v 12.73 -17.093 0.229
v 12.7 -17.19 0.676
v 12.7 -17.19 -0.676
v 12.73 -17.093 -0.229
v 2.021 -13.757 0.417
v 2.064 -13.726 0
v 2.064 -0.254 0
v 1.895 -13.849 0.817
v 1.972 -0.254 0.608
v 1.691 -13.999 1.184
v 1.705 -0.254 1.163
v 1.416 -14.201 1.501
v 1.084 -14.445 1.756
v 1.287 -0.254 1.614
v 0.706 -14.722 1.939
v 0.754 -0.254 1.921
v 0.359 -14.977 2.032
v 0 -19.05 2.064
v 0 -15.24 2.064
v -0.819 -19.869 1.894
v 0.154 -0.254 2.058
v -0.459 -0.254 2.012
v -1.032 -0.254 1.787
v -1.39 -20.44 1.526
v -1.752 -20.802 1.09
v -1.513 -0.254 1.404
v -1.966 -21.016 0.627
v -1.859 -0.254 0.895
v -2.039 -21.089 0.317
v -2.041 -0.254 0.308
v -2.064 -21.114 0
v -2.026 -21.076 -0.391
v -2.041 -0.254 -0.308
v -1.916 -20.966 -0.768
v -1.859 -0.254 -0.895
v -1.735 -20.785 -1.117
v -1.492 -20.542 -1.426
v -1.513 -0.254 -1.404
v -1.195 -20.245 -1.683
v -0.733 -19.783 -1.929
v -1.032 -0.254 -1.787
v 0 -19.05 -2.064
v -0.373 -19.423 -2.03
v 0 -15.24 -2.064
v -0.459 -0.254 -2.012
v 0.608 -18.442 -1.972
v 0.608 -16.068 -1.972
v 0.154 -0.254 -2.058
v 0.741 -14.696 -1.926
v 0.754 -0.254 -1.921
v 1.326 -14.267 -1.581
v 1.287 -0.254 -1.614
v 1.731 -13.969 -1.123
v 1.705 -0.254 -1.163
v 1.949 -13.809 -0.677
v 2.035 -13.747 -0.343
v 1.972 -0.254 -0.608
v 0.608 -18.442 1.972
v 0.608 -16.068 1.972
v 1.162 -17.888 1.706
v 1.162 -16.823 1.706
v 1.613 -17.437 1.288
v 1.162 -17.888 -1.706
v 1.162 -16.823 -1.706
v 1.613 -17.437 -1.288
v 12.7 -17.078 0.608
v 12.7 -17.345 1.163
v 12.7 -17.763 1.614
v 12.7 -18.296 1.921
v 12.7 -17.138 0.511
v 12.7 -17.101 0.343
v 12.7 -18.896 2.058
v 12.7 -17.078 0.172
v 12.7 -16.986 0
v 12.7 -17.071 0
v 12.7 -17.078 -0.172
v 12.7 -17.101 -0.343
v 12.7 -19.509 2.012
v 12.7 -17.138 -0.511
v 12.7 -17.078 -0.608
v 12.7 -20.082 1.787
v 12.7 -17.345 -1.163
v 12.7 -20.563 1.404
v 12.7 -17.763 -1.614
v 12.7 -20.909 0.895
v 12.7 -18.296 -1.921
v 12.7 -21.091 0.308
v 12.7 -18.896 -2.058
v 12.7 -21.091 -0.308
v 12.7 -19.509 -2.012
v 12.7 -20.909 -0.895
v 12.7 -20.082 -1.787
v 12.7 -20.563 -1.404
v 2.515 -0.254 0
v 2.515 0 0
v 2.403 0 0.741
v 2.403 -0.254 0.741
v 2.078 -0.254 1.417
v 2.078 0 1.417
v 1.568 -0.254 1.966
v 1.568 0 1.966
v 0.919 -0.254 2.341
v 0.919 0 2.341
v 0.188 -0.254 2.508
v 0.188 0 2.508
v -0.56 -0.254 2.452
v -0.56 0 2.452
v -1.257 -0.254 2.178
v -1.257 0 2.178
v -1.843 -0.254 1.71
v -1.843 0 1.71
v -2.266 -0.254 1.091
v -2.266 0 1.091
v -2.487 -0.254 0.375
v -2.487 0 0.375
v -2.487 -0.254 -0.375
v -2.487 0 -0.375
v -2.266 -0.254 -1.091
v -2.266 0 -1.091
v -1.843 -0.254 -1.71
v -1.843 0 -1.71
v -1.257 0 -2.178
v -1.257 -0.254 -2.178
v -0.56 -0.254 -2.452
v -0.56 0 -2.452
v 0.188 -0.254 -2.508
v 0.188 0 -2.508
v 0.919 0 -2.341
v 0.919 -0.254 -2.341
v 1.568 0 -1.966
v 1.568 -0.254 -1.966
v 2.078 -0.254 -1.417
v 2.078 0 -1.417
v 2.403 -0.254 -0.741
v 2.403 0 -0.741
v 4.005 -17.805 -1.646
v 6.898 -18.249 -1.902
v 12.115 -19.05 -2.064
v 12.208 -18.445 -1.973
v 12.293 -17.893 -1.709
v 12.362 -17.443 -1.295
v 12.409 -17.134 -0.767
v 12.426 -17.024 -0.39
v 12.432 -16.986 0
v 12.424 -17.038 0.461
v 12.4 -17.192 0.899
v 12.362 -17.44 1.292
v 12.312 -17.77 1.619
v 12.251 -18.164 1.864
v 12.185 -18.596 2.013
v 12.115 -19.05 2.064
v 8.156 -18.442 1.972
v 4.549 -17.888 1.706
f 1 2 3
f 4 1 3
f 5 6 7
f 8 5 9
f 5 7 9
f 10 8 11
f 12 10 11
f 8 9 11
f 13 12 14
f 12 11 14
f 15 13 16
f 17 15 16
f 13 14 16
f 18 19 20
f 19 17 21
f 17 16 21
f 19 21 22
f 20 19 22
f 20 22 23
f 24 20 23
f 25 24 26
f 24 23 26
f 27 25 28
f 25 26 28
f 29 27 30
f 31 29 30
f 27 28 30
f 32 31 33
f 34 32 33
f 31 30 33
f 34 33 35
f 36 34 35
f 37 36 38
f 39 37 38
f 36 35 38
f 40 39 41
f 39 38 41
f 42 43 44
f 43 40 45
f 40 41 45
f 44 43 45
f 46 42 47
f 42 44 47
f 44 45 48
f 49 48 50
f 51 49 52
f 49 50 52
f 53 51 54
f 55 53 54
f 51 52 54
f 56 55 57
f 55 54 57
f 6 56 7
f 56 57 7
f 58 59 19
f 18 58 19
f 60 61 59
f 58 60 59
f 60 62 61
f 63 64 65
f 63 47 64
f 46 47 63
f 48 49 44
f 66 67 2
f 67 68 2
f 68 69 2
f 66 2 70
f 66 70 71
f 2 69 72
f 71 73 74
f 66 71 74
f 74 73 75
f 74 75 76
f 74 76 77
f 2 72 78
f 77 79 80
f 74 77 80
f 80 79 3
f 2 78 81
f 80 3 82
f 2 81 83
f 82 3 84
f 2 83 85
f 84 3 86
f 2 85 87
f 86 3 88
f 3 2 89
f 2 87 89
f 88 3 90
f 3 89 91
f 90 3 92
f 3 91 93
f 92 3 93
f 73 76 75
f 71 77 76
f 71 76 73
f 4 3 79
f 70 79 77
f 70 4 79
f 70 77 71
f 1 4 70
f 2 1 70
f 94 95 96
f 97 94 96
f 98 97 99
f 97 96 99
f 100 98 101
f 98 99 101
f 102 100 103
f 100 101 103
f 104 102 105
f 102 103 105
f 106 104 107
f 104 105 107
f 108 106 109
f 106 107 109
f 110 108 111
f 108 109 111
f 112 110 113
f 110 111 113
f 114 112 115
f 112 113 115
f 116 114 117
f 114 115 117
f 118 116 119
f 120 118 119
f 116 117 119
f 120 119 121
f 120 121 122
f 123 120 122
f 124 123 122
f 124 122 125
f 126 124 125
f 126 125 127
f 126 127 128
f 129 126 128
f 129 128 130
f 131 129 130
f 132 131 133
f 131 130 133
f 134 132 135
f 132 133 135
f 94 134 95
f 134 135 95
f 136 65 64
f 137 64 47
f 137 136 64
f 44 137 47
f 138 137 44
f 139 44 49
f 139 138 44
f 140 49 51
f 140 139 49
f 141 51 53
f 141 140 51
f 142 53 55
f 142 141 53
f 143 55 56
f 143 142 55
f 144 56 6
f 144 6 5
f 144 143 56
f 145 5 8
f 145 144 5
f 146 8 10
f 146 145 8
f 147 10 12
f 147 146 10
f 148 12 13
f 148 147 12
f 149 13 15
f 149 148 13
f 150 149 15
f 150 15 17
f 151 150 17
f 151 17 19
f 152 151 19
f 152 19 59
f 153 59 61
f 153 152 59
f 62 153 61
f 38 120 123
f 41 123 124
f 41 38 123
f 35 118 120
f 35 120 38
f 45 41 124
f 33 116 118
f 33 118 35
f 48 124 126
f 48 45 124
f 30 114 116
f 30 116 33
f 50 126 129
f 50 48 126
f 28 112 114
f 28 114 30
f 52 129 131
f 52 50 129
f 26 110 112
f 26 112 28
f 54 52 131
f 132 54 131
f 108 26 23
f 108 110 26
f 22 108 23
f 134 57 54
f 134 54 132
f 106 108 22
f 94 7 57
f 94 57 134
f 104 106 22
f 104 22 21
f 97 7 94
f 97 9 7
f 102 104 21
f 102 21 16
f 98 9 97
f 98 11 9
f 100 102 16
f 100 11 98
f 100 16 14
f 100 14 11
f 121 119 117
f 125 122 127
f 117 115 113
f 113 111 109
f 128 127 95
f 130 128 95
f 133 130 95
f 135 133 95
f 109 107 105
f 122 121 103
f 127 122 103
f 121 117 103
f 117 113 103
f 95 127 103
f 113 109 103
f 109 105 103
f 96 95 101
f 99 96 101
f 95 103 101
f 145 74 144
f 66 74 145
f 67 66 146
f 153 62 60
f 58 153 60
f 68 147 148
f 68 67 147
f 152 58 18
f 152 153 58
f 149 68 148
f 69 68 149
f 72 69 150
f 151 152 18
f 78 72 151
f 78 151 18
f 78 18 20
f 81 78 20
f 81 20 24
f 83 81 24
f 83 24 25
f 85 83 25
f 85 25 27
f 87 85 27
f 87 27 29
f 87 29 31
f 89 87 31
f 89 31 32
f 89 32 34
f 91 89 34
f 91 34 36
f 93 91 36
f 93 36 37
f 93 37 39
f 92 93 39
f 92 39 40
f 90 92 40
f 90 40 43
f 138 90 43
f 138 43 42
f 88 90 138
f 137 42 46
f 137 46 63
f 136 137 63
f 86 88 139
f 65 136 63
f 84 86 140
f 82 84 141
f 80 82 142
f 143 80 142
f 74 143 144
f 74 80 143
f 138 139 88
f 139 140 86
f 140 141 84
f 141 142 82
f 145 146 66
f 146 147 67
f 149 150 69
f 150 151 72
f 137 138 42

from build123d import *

# Parameters (mm, degrees)
F0_R      = 2.06375
F1_DEPTH  = 12.7
F1_FACE_R = 2.06375
F5_R      = 2.5146
F6_DEPTH  = 0.254


with BuildPart() as f1:
    # F0 (on Front) → F1 (new body)
    with BuildSketch(Plane.XZ):
        Circle(F0_R)
    extrude(amount=F1_DEPTH)

    # F3: sweep along a path in F2
    with BuildLine(Plane.XY) as f3_path:
        Line((0, 0), (0, -19.05))
        Line((0, -19.05), (12.7, -19.05))
    # F1_face (on face) → F3 (sweep)
    with BuildSketch(Plane(origin=(0, 0, 0), x_dir=(1, 0, 0), z_dir=(0, 1, 0))):
        Circle(F1_FACE_R)
    sweep(path=f3_path.line, transition=Transition.RIGHT)

    # F4: sweep along a path in F2
    with BuildLine(Plane.XY) as f4_path:
        Line((0, 0), (0, -15.24))
        Line((0, -15.24), (12.115027858, -19.05))
    # F1_face (on face) → F4 (sweep)
    with BuildSketch(Plane(origin=(0, 0, 0), x_dir=(1, 0, 0), z_dir=(0, 1, 0))):
        Circle(F1_FACE_R)
    sweep(path=f4_path.line, transition=Transition.RIGHT)

    # F5 (on Front) → F6 (join)
    with BuildSketch(Plane.XZ):
        Circle(F5_R)
    extrude(amount=F6_DEPTH)


solid = f1.part
